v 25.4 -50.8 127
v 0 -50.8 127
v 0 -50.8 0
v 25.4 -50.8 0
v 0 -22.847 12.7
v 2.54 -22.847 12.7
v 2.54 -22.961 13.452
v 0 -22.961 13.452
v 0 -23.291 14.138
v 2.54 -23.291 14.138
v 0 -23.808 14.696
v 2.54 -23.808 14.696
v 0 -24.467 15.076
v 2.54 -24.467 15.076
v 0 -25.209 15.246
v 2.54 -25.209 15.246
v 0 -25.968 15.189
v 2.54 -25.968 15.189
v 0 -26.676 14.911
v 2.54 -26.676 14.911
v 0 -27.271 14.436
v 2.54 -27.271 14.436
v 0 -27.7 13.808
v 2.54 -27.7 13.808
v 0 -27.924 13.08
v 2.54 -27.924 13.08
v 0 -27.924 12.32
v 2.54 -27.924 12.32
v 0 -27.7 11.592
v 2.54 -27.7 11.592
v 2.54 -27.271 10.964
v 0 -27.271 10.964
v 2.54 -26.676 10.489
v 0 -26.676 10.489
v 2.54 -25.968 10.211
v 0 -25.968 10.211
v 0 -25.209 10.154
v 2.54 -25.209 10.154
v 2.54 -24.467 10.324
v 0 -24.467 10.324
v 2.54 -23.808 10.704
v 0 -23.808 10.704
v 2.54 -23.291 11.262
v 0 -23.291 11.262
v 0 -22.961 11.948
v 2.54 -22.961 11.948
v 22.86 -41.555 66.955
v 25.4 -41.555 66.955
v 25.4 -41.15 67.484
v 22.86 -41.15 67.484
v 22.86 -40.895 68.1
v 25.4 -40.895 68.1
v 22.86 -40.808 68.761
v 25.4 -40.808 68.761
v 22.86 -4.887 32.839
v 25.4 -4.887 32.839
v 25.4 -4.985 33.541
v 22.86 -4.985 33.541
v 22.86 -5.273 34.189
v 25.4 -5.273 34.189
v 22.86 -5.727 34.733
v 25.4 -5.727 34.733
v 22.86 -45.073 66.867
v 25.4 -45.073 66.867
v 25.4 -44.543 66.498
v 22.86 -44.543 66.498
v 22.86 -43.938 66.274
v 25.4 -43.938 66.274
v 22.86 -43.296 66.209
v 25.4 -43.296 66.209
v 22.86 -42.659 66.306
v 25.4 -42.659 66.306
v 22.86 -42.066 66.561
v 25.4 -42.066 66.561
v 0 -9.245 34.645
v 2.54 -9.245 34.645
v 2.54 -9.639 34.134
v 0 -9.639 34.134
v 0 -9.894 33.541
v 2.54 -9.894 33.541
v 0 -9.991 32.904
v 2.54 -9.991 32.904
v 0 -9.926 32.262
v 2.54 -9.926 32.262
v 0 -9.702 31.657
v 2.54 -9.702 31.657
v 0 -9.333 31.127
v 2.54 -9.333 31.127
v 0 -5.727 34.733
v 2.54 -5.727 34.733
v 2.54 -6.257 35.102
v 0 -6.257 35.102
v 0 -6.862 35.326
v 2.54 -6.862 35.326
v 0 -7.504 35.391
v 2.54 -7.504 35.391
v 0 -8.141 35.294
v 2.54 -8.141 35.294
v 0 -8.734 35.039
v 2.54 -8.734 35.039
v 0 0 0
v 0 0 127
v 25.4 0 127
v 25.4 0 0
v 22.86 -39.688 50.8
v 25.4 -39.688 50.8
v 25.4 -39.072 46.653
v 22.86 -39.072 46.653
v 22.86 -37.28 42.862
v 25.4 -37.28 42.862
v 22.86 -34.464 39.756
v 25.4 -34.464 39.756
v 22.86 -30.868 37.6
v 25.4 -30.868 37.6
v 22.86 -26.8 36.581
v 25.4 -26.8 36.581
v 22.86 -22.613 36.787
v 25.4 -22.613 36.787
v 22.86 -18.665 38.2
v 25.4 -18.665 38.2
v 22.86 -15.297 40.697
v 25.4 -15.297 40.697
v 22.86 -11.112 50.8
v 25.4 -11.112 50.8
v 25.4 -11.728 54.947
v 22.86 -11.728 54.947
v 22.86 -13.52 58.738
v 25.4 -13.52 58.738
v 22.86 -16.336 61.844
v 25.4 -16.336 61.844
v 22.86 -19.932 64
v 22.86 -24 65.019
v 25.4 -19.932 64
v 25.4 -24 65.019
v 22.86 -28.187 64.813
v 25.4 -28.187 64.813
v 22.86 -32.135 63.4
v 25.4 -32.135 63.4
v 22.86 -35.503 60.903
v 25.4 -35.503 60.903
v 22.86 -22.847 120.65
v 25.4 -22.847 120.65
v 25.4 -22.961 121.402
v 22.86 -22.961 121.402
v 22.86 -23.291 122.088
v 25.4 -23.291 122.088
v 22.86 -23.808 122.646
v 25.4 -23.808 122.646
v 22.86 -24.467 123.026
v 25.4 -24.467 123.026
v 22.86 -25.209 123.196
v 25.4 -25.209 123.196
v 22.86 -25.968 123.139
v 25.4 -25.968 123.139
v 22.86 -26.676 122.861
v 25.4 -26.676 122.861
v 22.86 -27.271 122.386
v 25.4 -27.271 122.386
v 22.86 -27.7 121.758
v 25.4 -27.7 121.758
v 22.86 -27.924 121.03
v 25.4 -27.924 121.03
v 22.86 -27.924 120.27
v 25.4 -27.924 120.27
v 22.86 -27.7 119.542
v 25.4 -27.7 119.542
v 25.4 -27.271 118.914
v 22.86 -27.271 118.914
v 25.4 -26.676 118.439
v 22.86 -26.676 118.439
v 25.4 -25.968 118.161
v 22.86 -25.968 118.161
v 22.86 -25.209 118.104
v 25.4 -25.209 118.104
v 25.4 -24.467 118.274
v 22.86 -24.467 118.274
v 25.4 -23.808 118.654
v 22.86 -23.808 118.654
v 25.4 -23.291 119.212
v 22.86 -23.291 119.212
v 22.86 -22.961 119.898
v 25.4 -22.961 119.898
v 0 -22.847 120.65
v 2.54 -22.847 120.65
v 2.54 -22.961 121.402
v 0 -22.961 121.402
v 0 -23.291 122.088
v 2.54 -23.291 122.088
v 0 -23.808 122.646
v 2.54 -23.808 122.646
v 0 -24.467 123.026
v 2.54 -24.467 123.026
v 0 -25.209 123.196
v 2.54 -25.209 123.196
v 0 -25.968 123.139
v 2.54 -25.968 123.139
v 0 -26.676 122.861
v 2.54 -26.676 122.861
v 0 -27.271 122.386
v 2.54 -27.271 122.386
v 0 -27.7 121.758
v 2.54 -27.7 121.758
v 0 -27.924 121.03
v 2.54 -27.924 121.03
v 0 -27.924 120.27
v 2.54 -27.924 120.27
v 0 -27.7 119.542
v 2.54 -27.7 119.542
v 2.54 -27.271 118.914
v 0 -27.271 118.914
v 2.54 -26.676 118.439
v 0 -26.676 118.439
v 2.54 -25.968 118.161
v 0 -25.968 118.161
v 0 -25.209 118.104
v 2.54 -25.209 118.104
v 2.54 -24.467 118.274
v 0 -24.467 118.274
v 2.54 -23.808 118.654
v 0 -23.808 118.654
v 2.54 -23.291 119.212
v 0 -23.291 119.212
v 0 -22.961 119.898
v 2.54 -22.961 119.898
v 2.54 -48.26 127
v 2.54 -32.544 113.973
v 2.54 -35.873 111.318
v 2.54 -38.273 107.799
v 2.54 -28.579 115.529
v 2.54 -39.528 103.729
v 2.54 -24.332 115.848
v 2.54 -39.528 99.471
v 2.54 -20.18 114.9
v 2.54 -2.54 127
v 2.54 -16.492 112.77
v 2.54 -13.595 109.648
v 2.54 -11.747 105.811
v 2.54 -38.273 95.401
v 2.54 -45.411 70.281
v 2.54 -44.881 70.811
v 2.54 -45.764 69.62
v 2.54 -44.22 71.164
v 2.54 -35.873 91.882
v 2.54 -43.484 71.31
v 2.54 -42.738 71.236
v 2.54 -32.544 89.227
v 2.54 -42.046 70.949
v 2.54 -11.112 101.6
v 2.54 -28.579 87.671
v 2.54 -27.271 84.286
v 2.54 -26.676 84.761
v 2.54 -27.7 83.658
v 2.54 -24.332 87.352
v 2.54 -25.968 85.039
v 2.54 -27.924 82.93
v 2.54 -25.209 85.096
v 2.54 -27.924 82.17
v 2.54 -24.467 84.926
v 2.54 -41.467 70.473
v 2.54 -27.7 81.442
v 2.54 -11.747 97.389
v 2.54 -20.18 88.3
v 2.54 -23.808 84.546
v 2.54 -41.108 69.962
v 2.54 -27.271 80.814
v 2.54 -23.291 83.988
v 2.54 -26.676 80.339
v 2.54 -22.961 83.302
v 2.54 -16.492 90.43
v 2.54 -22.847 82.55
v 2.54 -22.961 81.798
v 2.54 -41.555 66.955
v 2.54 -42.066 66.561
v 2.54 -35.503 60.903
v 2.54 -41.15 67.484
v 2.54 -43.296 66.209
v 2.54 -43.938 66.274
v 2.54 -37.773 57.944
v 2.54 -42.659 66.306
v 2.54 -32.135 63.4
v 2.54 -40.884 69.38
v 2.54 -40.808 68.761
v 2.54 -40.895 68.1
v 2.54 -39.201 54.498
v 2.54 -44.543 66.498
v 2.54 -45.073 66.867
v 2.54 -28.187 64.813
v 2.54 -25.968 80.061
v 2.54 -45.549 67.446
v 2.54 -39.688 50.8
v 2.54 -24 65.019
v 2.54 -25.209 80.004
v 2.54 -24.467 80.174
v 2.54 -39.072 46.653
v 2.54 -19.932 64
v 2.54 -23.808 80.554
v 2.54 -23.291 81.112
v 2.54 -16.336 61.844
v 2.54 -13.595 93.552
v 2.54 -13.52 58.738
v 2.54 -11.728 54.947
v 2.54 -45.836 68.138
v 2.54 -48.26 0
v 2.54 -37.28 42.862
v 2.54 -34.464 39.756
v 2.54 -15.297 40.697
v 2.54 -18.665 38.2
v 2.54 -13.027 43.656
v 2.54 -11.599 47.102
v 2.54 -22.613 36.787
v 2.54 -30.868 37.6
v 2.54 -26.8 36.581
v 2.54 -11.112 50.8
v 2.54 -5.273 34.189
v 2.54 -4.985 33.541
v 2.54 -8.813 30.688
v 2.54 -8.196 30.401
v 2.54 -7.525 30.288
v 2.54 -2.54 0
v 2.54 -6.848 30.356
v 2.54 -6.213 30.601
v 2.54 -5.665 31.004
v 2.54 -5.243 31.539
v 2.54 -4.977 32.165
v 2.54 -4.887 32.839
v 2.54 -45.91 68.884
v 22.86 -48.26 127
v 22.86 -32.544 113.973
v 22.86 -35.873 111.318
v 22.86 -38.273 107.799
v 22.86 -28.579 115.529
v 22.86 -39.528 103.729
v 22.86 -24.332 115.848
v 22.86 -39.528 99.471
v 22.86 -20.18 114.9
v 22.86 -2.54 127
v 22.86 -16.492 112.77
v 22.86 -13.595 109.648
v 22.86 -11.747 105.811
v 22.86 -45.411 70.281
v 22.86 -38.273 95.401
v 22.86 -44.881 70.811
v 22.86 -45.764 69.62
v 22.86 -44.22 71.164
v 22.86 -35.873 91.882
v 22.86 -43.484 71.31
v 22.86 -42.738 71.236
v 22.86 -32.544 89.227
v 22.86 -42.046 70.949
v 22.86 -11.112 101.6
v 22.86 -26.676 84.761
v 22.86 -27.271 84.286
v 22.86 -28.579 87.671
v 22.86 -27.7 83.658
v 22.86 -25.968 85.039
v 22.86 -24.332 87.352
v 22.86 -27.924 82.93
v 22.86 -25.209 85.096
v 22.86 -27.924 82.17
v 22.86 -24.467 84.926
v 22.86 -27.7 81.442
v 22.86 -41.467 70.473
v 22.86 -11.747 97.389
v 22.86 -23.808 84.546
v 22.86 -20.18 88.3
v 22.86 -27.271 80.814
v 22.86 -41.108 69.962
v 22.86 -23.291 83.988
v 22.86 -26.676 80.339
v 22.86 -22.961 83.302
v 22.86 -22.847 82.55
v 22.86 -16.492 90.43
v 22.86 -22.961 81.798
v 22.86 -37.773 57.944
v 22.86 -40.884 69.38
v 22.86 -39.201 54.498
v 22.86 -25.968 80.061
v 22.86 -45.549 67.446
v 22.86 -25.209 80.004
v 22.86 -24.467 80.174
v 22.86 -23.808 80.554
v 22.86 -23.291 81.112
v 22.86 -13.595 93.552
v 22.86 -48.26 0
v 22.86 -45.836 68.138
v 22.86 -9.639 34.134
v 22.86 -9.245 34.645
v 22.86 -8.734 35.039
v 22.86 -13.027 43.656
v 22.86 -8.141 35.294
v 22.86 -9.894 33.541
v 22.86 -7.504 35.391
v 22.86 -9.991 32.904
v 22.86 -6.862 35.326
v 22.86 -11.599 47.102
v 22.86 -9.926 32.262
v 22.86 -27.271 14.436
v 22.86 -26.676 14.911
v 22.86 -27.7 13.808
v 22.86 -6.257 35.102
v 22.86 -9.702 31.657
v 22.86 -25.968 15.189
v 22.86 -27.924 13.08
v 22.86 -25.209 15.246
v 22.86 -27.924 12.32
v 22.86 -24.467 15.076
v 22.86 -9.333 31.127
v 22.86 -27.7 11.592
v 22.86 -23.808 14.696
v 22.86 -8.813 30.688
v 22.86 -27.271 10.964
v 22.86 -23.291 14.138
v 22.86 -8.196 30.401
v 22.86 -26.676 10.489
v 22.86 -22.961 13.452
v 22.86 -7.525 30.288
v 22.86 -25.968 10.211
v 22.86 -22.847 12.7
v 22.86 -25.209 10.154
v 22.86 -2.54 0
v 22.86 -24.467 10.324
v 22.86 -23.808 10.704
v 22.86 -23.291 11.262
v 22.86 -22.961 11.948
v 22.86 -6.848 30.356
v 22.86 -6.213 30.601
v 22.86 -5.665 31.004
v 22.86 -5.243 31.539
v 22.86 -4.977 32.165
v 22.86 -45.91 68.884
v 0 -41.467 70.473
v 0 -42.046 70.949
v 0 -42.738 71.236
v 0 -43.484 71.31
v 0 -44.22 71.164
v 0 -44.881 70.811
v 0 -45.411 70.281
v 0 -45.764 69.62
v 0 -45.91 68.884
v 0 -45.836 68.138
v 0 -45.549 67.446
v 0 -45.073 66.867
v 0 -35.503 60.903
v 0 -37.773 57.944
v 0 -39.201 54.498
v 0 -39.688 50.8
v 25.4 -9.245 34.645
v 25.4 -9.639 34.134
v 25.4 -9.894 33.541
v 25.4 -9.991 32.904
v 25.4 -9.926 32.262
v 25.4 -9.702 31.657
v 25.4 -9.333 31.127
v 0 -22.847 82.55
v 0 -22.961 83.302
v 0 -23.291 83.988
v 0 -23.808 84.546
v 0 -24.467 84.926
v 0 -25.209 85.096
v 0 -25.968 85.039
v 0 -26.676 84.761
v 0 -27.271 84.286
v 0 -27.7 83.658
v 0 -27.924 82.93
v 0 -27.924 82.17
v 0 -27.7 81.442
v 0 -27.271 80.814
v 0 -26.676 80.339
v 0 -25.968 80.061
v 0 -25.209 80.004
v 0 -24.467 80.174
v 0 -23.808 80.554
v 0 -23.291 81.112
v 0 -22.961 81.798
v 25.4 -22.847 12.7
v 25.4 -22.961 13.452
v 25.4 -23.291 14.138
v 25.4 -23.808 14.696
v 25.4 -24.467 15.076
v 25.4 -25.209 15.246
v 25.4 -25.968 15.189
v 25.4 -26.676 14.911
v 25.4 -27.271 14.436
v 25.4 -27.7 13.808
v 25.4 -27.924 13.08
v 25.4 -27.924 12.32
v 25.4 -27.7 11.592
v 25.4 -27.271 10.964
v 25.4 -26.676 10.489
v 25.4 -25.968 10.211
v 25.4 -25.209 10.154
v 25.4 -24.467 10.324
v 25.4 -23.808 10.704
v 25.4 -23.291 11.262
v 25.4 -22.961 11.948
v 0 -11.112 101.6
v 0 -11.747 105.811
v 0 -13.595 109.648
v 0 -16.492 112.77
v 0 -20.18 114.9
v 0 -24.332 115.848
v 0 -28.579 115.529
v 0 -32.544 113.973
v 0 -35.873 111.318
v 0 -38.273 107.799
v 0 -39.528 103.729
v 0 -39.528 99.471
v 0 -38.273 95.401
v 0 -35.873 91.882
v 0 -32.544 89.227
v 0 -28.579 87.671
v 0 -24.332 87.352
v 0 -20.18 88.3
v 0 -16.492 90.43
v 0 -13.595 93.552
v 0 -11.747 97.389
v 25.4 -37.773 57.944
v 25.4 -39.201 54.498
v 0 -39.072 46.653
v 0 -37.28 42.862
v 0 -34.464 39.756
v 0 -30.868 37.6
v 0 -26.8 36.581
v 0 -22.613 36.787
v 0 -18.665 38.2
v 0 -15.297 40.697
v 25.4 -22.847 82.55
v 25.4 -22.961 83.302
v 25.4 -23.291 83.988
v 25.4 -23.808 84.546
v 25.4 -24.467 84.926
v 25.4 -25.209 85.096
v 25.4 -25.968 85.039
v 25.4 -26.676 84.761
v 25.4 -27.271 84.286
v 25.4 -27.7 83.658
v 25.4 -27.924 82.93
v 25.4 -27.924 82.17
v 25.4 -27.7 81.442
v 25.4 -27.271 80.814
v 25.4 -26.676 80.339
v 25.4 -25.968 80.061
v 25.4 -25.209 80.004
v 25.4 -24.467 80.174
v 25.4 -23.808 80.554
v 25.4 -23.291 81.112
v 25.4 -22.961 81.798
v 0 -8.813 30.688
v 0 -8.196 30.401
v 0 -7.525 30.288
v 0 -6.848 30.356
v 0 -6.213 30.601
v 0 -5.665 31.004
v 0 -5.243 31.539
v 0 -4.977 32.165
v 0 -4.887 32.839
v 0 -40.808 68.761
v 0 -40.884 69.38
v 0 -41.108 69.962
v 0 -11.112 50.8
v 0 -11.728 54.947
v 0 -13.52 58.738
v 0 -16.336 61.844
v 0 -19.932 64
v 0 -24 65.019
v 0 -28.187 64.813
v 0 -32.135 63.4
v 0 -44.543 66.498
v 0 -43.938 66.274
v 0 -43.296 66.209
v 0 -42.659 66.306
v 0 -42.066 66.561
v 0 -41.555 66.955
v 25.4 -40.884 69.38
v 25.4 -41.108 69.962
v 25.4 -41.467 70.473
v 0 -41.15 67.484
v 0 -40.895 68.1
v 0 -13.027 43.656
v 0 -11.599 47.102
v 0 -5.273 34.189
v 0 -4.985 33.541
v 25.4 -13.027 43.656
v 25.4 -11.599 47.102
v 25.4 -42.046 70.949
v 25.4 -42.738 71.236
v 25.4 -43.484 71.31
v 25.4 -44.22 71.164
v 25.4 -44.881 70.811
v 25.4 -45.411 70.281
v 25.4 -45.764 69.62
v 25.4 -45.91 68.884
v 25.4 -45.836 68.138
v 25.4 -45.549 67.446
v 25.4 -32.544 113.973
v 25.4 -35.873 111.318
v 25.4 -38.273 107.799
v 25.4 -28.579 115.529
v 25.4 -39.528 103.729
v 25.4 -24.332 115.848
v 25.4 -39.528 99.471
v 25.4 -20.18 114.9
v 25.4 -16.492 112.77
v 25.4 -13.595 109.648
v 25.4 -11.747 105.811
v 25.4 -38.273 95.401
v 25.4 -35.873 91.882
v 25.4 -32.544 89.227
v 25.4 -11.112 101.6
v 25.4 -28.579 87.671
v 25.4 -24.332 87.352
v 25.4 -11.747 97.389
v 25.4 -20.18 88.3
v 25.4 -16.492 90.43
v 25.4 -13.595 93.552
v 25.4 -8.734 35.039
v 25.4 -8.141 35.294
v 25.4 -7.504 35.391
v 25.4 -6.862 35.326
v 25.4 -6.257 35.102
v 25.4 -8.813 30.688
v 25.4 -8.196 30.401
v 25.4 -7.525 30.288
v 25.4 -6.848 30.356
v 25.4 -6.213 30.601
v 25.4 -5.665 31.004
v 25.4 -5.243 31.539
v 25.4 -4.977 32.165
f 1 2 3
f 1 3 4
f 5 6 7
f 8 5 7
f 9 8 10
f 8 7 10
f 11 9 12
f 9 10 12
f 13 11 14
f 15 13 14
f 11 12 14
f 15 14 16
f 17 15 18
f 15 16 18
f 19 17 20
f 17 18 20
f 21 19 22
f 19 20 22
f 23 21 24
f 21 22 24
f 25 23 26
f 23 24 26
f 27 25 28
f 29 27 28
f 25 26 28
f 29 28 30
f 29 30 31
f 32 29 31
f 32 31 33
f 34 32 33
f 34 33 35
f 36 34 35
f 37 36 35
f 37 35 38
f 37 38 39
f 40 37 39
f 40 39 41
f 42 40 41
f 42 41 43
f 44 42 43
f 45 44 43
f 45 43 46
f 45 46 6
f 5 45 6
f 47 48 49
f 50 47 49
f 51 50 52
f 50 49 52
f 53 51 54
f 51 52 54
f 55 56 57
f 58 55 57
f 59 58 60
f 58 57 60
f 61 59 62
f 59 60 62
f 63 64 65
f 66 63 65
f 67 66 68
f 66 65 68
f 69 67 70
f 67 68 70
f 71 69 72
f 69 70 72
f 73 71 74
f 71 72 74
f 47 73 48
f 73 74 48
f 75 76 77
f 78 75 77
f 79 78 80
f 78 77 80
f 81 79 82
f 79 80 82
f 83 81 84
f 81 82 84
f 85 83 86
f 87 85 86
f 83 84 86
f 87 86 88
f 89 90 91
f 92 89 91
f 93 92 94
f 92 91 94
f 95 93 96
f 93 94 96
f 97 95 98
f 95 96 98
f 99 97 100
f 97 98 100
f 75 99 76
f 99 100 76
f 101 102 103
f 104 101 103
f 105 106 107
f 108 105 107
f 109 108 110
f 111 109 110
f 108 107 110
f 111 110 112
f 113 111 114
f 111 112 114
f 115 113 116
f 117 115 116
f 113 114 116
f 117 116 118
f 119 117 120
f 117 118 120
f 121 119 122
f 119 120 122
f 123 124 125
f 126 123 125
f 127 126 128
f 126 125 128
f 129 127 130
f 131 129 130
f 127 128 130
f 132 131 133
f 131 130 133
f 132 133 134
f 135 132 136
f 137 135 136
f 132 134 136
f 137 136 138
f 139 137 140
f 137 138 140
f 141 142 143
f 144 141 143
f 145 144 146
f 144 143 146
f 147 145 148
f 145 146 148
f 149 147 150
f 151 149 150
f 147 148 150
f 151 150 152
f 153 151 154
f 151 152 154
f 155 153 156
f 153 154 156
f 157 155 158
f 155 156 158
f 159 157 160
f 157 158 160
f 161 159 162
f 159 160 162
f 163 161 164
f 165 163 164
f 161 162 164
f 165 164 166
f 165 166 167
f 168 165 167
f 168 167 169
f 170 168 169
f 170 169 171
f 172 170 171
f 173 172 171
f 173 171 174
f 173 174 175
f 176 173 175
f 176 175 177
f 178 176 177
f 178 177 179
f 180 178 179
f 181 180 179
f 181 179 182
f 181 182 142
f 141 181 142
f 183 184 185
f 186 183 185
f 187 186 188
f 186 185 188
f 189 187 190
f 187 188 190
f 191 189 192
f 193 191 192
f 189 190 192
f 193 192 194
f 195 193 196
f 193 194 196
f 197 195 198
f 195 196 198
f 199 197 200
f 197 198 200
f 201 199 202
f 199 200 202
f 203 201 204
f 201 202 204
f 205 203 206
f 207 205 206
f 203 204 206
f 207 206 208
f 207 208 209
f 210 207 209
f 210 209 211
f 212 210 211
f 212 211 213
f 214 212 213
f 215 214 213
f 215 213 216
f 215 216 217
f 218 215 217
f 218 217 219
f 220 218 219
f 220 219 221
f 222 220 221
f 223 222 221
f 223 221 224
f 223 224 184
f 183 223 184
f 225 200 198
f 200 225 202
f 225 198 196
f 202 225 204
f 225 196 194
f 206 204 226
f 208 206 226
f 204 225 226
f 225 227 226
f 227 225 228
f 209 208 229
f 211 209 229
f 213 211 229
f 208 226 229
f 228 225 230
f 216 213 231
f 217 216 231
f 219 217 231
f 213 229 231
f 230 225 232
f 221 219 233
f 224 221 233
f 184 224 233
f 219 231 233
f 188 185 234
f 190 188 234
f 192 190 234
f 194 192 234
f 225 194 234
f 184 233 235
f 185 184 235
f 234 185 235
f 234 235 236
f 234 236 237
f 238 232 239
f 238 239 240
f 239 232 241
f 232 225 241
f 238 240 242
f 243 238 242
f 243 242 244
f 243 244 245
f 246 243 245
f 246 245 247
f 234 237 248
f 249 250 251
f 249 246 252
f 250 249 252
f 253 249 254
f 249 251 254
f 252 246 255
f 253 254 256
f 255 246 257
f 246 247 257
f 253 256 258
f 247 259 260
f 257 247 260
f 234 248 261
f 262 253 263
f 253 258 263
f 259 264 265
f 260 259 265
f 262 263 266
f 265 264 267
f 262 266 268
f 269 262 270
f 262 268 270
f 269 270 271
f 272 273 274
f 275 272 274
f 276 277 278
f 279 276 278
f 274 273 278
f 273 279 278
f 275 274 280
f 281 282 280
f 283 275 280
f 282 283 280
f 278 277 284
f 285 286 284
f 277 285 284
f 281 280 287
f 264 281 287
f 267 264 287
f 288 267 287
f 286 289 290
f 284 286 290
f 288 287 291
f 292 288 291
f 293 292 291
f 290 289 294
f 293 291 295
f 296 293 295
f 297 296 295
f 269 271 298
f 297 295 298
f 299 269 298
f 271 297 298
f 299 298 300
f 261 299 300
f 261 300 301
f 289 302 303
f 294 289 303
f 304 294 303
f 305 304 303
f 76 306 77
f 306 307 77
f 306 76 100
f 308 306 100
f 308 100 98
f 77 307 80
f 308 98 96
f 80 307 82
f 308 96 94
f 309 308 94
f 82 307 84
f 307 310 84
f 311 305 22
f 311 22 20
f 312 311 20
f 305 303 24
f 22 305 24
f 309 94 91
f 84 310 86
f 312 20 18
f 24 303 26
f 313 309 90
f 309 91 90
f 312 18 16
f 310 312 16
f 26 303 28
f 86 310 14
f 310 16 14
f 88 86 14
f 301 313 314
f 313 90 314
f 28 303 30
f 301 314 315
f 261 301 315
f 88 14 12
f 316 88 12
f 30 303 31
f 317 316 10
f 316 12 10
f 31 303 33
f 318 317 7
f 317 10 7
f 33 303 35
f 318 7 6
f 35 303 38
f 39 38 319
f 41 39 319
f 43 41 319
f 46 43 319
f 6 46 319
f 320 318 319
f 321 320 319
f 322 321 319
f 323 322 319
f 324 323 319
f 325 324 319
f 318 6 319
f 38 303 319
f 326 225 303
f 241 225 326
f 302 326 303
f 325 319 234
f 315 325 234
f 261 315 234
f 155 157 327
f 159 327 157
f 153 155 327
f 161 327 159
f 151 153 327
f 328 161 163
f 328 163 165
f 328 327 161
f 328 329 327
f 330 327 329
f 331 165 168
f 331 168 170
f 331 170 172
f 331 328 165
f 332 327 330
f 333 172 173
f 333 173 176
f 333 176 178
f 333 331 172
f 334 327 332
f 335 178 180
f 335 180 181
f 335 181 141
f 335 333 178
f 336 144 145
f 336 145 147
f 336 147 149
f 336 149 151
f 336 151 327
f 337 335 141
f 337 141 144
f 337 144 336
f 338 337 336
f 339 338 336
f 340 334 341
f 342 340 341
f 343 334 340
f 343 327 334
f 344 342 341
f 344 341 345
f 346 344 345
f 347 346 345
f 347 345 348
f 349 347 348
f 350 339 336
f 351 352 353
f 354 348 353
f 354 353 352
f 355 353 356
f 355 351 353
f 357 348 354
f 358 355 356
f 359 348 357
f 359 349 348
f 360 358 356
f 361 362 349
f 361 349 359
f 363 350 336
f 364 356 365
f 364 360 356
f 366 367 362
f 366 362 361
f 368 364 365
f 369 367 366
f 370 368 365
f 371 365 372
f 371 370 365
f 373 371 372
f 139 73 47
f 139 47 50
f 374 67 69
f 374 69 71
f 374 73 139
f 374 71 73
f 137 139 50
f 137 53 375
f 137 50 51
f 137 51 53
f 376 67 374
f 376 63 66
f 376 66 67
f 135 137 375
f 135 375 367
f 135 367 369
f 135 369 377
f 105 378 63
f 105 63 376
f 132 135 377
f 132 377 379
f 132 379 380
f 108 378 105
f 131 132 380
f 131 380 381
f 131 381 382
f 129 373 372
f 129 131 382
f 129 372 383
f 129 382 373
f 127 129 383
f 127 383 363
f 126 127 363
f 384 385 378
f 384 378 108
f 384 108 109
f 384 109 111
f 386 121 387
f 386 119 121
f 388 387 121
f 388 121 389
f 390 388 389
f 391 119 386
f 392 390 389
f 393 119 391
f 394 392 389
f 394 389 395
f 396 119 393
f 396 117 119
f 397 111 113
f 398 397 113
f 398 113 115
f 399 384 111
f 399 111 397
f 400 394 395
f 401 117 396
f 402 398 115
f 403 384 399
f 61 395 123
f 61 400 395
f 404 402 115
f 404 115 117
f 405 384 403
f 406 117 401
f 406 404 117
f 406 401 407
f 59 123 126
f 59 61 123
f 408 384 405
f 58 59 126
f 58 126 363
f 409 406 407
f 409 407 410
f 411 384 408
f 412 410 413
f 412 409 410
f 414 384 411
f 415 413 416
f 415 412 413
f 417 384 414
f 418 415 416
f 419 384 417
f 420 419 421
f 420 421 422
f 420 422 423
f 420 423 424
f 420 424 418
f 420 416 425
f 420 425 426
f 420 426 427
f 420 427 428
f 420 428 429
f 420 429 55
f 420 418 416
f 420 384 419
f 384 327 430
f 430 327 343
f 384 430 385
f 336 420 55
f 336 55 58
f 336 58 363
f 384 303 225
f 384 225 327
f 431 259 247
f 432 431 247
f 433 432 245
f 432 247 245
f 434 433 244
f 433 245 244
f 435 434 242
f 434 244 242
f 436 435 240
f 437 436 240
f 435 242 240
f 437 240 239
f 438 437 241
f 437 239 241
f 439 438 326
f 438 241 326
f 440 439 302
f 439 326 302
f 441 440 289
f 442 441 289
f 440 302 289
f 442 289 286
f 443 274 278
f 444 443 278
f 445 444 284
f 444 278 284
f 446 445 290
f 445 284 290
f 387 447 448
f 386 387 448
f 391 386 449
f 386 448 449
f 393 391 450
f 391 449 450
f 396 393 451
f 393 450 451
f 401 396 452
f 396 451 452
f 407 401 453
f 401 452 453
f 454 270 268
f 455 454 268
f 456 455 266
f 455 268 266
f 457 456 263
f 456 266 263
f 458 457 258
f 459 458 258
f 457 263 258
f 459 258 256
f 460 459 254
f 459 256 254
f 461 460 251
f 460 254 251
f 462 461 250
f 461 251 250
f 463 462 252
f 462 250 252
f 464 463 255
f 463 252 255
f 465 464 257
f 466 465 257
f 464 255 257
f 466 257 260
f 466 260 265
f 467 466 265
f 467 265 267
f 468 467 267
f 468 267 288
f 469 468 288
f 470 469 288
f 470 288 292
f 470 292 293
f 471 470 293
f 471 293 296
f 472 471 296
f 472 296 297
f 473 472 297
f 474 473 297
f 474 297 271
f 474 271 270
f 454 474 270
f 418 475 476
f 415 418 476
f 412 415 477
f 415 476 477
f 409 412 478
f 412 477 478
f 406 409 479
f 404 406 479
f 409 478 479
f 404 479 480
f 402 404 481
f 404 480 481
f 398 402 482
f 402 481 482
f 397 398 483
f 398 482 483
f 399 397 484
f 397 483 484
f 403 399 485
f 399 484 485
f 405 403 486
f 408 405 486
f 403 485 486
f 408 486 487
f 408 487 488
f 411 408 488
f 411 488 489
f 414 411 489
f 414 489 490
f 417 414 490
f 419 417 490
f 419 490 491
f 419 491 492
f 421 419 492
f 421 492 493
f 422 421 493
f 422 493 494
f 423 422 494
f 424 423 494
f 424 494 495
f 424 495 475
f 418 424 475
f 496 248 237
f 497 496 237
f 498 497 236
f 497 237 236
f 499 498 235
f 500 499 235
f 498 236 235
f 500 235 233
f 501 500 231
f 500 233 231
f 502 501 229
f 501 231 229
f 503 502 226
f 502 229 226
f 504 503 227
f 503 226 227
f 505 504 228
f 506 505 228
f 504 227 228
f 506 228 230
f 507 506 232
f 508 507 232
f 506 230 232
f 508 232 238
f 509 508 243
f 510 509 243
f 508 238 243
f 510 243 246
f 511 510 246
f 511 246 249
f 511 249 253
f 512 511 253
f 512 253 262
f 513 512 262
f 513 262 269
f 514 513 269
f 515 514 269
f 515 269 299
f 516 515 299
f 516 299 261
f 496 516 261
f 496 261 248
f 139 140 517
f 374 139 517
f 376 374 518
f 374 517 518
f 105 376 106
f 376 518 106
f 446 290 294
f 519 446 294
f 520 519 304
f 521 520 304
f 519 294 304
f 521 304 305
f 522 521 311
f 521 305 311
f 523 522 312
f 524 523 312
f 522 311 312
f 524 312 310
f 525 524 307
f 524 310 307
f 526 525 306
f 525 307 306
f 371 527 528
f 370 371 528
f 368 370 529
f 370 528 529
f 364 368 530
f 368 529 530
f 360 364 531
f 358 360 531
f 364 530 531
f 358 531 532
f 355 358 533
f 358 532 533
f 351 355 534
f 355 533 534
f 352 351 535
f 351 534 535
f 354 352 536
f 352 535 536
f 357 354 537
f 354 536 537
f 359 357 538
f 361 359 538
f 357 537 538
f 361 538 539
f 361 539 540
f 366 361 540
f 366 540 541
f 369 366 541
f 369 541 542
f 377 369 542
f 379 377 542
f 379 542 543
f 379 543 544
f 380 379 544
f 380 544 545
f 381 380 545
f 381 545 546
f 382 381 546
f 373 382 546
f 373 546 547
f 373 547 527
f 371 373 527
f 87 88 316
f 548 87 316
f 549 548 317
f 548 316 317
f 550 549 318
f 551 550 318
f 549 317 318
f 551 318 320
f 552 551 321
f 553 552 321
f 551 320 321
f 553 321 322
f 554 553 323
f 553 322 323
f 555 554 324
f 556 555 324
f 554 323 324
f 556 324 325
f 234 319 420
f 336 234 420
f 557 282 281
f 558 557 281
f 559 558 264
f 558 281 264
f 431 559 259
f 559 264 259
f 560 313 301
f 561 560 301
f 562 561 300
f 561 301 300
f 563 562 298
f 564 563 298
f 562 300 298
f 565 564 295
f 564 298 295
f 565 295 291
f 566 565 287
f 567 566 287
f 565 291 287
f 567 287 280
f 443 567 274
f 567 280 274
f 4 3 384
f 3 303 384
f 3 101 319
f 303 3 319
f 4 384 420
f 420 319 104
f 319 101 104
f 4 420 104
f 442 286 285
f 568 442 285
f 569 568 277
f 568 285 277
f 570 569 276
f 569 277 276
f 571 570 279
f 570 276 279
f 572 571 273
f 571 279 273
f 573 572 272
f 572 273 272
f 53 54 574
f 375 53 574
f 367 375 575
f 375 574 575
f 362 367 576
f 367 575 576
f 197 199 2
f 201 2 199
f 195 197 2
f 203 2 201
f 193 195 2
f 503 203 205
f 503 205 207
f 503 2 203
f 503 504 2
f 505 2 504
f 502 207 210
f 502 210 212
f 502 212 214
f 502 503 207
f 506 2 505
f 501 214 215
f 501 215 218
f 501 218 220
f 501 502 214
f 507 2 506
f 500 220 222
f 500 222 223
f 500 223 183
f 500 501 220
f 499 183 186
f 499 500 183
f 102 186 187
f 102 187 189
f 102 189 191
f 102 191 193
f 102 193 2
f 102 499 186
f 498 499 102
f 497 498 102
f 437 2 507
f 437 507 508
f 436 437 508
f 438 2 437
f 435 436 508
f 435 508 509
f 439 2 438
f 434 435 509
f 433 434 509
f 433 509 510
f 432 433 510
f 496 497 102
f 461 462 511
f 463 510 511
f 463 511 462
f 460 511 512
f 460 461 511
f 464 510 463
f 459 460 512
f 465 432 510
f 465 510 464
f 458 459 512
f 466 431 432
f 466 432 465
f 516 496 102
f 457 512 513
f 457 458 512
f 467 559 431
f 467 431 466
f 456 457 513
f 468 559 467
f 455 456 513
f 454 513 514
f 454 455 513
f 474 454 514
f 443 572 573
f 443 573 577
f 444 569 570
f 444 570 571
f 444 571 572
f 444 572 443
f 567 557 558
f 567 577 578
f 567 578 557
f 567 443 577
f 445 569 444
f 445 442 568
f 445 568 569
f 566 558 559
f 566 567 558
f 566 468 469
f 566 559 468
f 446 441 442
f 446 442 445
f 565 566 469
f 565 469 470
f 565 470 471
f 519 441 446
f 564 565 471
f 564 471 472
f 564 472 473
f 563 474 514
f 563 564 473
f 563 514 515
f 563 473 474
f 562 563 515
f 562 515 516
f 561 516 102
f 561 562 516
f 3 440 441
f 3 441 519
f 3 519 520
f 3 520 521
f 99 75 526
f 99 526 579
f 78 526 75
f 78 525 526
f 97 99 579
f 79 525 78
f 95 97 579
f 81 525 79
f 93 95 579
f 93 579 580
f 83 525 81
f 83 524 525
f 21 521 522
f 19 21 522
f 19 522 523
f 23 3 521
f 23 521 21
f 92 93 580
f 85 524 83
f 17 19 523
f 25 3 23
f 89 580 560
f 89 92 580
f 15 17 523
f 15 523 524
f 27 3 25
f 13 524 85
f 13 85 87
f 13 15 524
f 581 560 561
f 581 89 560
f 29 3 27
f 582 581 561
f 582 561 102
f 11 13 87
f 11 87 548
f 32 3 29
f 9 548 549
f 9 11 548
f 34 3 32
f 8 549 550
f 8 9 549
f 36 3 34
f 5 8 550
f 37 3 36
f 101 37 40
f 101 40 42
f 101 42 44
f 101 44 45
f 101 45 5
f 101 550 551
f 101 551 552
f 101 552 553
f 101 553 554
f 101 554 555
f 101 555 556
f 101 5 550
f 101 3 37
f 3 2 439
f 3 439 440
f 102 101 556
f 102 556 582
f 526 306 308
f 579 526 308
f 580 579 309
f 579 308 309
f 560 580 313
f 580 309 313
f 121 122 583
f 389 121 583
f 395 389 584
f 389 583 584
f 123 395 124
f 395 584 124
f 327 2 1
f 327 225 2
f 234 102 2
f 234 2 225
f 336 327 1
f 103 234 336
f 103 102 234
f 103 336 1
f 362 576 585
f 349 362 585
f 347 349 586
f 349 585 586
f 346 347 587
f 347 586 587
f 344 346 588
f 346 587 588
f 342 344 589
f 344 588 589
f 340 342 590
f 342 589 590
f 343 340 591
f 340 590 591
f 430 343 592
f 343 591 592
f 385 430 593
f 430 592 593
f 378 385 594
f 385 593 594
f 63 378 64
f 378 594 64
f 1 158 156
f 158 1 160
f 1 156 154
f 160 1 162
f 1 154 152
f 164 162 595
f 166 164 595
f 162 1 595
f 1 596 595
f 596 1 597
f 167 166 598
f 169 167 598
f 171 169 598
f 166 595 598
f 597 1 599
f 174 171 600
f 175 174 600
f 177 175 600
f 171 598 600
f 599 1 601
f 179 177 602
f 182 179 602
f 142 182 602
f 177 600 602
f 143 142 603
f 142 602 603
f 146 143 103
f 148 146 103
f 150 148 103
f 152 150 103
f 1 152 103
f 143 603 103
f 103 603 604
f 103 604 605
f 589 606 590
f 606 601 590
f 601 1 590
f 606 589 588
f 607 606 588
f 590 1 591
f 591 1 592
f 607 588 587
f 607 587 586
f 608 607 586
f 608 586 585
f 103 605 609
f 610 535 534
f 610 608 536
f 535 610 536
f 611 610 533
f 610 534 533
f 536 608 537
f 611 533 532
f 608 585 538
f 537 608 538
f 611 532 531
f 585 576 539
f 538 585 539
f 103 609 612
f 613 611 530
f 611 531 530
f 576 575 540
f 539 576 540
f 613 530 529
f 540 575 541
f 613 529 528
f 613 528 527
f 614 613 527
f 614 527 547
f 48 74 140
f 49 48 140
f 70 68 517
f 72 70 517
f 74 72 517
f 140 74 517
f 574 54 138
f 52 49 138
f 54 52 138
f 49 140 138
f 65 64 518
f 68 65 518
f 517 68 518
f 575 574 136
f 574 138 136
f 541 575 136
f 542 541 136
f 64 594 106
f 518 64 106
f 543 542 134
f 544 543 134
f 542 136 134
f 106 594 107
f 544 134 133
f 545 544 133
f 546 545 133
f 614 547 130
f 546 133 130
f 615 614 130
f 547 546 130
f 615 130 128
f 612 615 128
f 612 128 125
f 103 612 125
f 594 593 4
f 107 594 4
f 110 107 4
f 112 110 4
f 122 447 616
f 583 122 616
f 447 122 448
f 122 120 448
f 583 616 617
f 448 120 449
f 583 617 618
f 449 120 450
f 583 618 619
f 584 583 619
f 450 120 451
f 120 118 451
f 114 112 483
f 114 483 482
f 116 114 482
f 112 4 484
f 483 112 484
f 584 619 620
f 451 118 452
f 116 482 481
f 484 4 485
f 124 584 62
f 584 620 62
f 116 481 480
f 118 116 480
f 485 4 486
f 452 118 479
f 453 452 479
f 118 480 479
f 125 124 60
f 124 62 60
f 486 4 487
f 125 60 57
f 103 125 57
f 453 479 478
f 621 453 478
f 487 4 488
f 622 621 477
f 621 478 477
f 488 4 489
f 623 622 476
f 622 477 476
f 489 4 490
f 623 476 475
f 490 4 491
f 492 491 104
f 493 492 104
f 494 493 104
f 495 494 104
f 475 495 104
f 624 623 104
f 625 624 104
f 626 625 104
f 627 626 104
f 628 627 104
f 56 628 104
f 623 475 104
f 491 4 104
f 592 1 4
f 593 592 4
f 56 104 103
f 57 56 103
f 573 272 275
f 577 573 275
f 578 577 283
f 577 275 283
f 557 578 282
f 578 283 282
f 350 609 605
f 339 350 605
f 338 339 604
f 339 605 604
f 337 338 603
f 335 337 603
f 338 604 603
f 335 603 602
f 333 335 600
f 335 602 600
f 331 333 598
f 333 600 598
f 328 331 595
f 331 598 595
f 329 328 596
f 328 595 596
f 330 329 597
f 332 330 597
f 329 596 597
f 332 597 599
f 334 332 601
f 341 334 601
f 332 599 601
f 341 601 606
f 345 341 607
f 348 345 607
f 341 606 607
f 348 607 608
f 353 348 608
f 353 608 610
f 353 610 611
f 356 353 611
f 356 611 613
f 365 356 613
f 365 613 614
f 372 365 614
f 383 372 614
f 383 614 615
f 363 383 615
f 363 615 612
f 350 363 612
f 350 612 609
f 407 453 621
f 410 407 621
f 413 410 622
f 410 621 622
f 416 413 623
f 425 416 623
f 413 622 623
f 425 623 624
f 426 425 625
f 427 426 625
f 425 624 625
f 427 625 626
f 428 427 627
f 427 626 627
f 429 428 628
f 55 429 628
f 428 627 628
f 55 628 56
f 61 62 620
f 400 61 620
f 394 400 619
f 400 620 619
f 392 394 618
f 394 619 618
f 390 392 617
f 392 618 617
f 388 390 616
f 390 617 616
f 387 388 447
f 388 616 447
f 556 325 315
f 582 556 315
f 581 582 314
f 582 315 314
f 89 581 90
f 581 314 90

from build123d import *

# Parameters (mm, degrees)
F0_W     = 25.4
F0_H     = 50.8
F0_W_2   = 20.32
F0_H_2   = 45.72
F1_DEPTH = 127
F2_R     = 2.5527
F2_R_2   = 14.2875
F3_DEPTH = 50.8


# Not quite as in the source:
# - a feature names something its author has since deleted; it is built from what else it names


with BuildPart() as f1:
    # F0 (on Top) → F1 (new body)
    with BuildSketch(Plane.XY):
        with Locations((12.7, -25.4)):
            Rectangle(F0_W, F0_H)
        with Locations((12.7, -25.4)):
            Rectangle(F0_W_2, F0_H_2, mode=Mode.SUBTRACT)
    extrude(amount=F1_DEPTH)

    # F2 (on face) → F3 (cut)
    with BuildSketch(Plane.YZ.offset(25.4)):
        with BuildLine():
            ThreePointArc((-43.3605122421, 68.7605122421), (-42.4353064615, 69.6403379418), (-41.467058279, 70.4725605415))
            ThreePointArc((-41.467058279, 70.4725605415), (-45.1655437225, 70.5655437225), (-45.0725605415, 66.867058279))
            ThreePointArc((-45.0725605415, 66.867058279), (-44.2403379418, 67.8353064615), (-43.3605122421, 68.7605122421))
        make_face()
        with Locations((-25.4, 82.55)):
            Circle(F2_R)
        with Locations((-25.4, 12.7)):
            Circle(F2_R)
        with BuildLine():
            Line((-25.4, 50.8), (-15.2972118638, 40.6972118638))
            ThreePointArc((-15.2972118638, 40.6972118638), (-12.2000711792, 45.3324104601), (-11.1125, 50.8))
            ThreePointArc((-11.1125, 50.8), (-19.9324104601, 63.9999288208), (-35.5027881362, 60.9027881362))
            Line((-35.5027881362, 60.9027881362), (-25.4, 50.8))
        make_face()
        with BuildLine():
            Line((-25.4, 50.8), (-35.5027881362, 60.9027881362))
            ThreePointArc((-35.5027881362, 60.9027881362), (-38.5999288208, 56.2675895399), (-39.6875, 50.8))
            Line((-39.6875, 50.8), (-25.4, 50.8))
        make_face()
        with BuildLine():
            Line((-41.5554807618, 66.9554807618), (-43.3605122421, 68.7605122421))
            ThreePointArc((-43.3605122421, 68.7605122421), (-44.2403379418, 67.8353064615), (-45.0725605415, 66.867058279))
            ThreePointArc((-45.0725605415, 66.867058279), (-43.2963553886, 66.2086185946), (-41.5554807618, 66.9554807618))
        make_face()
        with BuildLine():
            ThreePointArc((-40.8078122421, 68.7605122421), (-40.9783181672, 69.6778064584), (-41.467058279, 70.4725605415))
            ThreePointArc((-41.467058279, 70.4725605415), (-42.4353064615, 69.6403379418), (-43.3605122421, 68.7605122421))
            Line((-43.3605122421, 68.7605122421), (-41.5554807618, 66.9554807618))
            ThreePointArc((-41.5554807618, 66.9554807618), (-41.0021249595, 67.7836362443), (-40.8078122421, 68.7605122421))
        make_face()
        with BuildLine():
            ThreePointArc((-39.6875, 50.8), (-30.8675895399, 37.6000711792), (-15.2972118638, 40.6972118638))
            Line((-15.2972118638, 40.6972118638), (-25.4, 50.8))
            Line((-25.4, 50.8), (-39.6875, 50.8))
        make_face()
        with BuildLine():
            ThreePointArc((-4.8867877579, 32.8394877579), (-5.1063972127, 33.8753283817), (-5.7274394585, 34.732941721))
            ThreePointArc((-5.7274394585, 34.732941721), (-6.5596620582, 33.7646935385), (-7.4394877579, 32.8394877579))
            ThreePointArc((-7.4394877579, 32.8394877579), (-8.3646935385, 31.9596620582), (-9.332941721, 31.1274394585))
            ThreePointArc((-9.332941721, 31.1274394585), (-6.5221935416, 30.4572936829), (-4.8867877579, 32.8394877579))
        make_face()
        with BuildLine():
            ThreePointArc((-7.4394877579, 32.8394877579), (-6.5596620582, 33.7646935385), (-5.7274394585, 34.732941721))
            ThreePointArc((-5.7274394585, 34.732941721), (-7.5036446114, 35.3913814054), (-9.2445192382, 34.6445192382))
            Line((-9.2445192382, 34.6445192382), (-7.4394877579, 32.8394877579))
        make_face()
        with BuildLine():
            ThreePointArc((-9.332941721, 31.1274394585), (-8.3646935385, 31.9596620582), (-7.4394877579, 32.8394877579))
            Line((-7.4394877579, 32.8394877579), (-9.2445192382, 34.6445192382))
            ThreePointArc((-9.2445192382, 34.6445192382), (-9.9913814054, 32.9036446114), (-9.332941721, 31.1274394585))
        make_face()
        with Locations((-25.4, 120.65)):
            Circle(F2_R)
        with Locations((-25.4, 101.6)):
            Circle(F2_R_2)
    extrude(amount=-F3_DEPTH, mode=Mode.SUBTRACT)


solid = f1.part
